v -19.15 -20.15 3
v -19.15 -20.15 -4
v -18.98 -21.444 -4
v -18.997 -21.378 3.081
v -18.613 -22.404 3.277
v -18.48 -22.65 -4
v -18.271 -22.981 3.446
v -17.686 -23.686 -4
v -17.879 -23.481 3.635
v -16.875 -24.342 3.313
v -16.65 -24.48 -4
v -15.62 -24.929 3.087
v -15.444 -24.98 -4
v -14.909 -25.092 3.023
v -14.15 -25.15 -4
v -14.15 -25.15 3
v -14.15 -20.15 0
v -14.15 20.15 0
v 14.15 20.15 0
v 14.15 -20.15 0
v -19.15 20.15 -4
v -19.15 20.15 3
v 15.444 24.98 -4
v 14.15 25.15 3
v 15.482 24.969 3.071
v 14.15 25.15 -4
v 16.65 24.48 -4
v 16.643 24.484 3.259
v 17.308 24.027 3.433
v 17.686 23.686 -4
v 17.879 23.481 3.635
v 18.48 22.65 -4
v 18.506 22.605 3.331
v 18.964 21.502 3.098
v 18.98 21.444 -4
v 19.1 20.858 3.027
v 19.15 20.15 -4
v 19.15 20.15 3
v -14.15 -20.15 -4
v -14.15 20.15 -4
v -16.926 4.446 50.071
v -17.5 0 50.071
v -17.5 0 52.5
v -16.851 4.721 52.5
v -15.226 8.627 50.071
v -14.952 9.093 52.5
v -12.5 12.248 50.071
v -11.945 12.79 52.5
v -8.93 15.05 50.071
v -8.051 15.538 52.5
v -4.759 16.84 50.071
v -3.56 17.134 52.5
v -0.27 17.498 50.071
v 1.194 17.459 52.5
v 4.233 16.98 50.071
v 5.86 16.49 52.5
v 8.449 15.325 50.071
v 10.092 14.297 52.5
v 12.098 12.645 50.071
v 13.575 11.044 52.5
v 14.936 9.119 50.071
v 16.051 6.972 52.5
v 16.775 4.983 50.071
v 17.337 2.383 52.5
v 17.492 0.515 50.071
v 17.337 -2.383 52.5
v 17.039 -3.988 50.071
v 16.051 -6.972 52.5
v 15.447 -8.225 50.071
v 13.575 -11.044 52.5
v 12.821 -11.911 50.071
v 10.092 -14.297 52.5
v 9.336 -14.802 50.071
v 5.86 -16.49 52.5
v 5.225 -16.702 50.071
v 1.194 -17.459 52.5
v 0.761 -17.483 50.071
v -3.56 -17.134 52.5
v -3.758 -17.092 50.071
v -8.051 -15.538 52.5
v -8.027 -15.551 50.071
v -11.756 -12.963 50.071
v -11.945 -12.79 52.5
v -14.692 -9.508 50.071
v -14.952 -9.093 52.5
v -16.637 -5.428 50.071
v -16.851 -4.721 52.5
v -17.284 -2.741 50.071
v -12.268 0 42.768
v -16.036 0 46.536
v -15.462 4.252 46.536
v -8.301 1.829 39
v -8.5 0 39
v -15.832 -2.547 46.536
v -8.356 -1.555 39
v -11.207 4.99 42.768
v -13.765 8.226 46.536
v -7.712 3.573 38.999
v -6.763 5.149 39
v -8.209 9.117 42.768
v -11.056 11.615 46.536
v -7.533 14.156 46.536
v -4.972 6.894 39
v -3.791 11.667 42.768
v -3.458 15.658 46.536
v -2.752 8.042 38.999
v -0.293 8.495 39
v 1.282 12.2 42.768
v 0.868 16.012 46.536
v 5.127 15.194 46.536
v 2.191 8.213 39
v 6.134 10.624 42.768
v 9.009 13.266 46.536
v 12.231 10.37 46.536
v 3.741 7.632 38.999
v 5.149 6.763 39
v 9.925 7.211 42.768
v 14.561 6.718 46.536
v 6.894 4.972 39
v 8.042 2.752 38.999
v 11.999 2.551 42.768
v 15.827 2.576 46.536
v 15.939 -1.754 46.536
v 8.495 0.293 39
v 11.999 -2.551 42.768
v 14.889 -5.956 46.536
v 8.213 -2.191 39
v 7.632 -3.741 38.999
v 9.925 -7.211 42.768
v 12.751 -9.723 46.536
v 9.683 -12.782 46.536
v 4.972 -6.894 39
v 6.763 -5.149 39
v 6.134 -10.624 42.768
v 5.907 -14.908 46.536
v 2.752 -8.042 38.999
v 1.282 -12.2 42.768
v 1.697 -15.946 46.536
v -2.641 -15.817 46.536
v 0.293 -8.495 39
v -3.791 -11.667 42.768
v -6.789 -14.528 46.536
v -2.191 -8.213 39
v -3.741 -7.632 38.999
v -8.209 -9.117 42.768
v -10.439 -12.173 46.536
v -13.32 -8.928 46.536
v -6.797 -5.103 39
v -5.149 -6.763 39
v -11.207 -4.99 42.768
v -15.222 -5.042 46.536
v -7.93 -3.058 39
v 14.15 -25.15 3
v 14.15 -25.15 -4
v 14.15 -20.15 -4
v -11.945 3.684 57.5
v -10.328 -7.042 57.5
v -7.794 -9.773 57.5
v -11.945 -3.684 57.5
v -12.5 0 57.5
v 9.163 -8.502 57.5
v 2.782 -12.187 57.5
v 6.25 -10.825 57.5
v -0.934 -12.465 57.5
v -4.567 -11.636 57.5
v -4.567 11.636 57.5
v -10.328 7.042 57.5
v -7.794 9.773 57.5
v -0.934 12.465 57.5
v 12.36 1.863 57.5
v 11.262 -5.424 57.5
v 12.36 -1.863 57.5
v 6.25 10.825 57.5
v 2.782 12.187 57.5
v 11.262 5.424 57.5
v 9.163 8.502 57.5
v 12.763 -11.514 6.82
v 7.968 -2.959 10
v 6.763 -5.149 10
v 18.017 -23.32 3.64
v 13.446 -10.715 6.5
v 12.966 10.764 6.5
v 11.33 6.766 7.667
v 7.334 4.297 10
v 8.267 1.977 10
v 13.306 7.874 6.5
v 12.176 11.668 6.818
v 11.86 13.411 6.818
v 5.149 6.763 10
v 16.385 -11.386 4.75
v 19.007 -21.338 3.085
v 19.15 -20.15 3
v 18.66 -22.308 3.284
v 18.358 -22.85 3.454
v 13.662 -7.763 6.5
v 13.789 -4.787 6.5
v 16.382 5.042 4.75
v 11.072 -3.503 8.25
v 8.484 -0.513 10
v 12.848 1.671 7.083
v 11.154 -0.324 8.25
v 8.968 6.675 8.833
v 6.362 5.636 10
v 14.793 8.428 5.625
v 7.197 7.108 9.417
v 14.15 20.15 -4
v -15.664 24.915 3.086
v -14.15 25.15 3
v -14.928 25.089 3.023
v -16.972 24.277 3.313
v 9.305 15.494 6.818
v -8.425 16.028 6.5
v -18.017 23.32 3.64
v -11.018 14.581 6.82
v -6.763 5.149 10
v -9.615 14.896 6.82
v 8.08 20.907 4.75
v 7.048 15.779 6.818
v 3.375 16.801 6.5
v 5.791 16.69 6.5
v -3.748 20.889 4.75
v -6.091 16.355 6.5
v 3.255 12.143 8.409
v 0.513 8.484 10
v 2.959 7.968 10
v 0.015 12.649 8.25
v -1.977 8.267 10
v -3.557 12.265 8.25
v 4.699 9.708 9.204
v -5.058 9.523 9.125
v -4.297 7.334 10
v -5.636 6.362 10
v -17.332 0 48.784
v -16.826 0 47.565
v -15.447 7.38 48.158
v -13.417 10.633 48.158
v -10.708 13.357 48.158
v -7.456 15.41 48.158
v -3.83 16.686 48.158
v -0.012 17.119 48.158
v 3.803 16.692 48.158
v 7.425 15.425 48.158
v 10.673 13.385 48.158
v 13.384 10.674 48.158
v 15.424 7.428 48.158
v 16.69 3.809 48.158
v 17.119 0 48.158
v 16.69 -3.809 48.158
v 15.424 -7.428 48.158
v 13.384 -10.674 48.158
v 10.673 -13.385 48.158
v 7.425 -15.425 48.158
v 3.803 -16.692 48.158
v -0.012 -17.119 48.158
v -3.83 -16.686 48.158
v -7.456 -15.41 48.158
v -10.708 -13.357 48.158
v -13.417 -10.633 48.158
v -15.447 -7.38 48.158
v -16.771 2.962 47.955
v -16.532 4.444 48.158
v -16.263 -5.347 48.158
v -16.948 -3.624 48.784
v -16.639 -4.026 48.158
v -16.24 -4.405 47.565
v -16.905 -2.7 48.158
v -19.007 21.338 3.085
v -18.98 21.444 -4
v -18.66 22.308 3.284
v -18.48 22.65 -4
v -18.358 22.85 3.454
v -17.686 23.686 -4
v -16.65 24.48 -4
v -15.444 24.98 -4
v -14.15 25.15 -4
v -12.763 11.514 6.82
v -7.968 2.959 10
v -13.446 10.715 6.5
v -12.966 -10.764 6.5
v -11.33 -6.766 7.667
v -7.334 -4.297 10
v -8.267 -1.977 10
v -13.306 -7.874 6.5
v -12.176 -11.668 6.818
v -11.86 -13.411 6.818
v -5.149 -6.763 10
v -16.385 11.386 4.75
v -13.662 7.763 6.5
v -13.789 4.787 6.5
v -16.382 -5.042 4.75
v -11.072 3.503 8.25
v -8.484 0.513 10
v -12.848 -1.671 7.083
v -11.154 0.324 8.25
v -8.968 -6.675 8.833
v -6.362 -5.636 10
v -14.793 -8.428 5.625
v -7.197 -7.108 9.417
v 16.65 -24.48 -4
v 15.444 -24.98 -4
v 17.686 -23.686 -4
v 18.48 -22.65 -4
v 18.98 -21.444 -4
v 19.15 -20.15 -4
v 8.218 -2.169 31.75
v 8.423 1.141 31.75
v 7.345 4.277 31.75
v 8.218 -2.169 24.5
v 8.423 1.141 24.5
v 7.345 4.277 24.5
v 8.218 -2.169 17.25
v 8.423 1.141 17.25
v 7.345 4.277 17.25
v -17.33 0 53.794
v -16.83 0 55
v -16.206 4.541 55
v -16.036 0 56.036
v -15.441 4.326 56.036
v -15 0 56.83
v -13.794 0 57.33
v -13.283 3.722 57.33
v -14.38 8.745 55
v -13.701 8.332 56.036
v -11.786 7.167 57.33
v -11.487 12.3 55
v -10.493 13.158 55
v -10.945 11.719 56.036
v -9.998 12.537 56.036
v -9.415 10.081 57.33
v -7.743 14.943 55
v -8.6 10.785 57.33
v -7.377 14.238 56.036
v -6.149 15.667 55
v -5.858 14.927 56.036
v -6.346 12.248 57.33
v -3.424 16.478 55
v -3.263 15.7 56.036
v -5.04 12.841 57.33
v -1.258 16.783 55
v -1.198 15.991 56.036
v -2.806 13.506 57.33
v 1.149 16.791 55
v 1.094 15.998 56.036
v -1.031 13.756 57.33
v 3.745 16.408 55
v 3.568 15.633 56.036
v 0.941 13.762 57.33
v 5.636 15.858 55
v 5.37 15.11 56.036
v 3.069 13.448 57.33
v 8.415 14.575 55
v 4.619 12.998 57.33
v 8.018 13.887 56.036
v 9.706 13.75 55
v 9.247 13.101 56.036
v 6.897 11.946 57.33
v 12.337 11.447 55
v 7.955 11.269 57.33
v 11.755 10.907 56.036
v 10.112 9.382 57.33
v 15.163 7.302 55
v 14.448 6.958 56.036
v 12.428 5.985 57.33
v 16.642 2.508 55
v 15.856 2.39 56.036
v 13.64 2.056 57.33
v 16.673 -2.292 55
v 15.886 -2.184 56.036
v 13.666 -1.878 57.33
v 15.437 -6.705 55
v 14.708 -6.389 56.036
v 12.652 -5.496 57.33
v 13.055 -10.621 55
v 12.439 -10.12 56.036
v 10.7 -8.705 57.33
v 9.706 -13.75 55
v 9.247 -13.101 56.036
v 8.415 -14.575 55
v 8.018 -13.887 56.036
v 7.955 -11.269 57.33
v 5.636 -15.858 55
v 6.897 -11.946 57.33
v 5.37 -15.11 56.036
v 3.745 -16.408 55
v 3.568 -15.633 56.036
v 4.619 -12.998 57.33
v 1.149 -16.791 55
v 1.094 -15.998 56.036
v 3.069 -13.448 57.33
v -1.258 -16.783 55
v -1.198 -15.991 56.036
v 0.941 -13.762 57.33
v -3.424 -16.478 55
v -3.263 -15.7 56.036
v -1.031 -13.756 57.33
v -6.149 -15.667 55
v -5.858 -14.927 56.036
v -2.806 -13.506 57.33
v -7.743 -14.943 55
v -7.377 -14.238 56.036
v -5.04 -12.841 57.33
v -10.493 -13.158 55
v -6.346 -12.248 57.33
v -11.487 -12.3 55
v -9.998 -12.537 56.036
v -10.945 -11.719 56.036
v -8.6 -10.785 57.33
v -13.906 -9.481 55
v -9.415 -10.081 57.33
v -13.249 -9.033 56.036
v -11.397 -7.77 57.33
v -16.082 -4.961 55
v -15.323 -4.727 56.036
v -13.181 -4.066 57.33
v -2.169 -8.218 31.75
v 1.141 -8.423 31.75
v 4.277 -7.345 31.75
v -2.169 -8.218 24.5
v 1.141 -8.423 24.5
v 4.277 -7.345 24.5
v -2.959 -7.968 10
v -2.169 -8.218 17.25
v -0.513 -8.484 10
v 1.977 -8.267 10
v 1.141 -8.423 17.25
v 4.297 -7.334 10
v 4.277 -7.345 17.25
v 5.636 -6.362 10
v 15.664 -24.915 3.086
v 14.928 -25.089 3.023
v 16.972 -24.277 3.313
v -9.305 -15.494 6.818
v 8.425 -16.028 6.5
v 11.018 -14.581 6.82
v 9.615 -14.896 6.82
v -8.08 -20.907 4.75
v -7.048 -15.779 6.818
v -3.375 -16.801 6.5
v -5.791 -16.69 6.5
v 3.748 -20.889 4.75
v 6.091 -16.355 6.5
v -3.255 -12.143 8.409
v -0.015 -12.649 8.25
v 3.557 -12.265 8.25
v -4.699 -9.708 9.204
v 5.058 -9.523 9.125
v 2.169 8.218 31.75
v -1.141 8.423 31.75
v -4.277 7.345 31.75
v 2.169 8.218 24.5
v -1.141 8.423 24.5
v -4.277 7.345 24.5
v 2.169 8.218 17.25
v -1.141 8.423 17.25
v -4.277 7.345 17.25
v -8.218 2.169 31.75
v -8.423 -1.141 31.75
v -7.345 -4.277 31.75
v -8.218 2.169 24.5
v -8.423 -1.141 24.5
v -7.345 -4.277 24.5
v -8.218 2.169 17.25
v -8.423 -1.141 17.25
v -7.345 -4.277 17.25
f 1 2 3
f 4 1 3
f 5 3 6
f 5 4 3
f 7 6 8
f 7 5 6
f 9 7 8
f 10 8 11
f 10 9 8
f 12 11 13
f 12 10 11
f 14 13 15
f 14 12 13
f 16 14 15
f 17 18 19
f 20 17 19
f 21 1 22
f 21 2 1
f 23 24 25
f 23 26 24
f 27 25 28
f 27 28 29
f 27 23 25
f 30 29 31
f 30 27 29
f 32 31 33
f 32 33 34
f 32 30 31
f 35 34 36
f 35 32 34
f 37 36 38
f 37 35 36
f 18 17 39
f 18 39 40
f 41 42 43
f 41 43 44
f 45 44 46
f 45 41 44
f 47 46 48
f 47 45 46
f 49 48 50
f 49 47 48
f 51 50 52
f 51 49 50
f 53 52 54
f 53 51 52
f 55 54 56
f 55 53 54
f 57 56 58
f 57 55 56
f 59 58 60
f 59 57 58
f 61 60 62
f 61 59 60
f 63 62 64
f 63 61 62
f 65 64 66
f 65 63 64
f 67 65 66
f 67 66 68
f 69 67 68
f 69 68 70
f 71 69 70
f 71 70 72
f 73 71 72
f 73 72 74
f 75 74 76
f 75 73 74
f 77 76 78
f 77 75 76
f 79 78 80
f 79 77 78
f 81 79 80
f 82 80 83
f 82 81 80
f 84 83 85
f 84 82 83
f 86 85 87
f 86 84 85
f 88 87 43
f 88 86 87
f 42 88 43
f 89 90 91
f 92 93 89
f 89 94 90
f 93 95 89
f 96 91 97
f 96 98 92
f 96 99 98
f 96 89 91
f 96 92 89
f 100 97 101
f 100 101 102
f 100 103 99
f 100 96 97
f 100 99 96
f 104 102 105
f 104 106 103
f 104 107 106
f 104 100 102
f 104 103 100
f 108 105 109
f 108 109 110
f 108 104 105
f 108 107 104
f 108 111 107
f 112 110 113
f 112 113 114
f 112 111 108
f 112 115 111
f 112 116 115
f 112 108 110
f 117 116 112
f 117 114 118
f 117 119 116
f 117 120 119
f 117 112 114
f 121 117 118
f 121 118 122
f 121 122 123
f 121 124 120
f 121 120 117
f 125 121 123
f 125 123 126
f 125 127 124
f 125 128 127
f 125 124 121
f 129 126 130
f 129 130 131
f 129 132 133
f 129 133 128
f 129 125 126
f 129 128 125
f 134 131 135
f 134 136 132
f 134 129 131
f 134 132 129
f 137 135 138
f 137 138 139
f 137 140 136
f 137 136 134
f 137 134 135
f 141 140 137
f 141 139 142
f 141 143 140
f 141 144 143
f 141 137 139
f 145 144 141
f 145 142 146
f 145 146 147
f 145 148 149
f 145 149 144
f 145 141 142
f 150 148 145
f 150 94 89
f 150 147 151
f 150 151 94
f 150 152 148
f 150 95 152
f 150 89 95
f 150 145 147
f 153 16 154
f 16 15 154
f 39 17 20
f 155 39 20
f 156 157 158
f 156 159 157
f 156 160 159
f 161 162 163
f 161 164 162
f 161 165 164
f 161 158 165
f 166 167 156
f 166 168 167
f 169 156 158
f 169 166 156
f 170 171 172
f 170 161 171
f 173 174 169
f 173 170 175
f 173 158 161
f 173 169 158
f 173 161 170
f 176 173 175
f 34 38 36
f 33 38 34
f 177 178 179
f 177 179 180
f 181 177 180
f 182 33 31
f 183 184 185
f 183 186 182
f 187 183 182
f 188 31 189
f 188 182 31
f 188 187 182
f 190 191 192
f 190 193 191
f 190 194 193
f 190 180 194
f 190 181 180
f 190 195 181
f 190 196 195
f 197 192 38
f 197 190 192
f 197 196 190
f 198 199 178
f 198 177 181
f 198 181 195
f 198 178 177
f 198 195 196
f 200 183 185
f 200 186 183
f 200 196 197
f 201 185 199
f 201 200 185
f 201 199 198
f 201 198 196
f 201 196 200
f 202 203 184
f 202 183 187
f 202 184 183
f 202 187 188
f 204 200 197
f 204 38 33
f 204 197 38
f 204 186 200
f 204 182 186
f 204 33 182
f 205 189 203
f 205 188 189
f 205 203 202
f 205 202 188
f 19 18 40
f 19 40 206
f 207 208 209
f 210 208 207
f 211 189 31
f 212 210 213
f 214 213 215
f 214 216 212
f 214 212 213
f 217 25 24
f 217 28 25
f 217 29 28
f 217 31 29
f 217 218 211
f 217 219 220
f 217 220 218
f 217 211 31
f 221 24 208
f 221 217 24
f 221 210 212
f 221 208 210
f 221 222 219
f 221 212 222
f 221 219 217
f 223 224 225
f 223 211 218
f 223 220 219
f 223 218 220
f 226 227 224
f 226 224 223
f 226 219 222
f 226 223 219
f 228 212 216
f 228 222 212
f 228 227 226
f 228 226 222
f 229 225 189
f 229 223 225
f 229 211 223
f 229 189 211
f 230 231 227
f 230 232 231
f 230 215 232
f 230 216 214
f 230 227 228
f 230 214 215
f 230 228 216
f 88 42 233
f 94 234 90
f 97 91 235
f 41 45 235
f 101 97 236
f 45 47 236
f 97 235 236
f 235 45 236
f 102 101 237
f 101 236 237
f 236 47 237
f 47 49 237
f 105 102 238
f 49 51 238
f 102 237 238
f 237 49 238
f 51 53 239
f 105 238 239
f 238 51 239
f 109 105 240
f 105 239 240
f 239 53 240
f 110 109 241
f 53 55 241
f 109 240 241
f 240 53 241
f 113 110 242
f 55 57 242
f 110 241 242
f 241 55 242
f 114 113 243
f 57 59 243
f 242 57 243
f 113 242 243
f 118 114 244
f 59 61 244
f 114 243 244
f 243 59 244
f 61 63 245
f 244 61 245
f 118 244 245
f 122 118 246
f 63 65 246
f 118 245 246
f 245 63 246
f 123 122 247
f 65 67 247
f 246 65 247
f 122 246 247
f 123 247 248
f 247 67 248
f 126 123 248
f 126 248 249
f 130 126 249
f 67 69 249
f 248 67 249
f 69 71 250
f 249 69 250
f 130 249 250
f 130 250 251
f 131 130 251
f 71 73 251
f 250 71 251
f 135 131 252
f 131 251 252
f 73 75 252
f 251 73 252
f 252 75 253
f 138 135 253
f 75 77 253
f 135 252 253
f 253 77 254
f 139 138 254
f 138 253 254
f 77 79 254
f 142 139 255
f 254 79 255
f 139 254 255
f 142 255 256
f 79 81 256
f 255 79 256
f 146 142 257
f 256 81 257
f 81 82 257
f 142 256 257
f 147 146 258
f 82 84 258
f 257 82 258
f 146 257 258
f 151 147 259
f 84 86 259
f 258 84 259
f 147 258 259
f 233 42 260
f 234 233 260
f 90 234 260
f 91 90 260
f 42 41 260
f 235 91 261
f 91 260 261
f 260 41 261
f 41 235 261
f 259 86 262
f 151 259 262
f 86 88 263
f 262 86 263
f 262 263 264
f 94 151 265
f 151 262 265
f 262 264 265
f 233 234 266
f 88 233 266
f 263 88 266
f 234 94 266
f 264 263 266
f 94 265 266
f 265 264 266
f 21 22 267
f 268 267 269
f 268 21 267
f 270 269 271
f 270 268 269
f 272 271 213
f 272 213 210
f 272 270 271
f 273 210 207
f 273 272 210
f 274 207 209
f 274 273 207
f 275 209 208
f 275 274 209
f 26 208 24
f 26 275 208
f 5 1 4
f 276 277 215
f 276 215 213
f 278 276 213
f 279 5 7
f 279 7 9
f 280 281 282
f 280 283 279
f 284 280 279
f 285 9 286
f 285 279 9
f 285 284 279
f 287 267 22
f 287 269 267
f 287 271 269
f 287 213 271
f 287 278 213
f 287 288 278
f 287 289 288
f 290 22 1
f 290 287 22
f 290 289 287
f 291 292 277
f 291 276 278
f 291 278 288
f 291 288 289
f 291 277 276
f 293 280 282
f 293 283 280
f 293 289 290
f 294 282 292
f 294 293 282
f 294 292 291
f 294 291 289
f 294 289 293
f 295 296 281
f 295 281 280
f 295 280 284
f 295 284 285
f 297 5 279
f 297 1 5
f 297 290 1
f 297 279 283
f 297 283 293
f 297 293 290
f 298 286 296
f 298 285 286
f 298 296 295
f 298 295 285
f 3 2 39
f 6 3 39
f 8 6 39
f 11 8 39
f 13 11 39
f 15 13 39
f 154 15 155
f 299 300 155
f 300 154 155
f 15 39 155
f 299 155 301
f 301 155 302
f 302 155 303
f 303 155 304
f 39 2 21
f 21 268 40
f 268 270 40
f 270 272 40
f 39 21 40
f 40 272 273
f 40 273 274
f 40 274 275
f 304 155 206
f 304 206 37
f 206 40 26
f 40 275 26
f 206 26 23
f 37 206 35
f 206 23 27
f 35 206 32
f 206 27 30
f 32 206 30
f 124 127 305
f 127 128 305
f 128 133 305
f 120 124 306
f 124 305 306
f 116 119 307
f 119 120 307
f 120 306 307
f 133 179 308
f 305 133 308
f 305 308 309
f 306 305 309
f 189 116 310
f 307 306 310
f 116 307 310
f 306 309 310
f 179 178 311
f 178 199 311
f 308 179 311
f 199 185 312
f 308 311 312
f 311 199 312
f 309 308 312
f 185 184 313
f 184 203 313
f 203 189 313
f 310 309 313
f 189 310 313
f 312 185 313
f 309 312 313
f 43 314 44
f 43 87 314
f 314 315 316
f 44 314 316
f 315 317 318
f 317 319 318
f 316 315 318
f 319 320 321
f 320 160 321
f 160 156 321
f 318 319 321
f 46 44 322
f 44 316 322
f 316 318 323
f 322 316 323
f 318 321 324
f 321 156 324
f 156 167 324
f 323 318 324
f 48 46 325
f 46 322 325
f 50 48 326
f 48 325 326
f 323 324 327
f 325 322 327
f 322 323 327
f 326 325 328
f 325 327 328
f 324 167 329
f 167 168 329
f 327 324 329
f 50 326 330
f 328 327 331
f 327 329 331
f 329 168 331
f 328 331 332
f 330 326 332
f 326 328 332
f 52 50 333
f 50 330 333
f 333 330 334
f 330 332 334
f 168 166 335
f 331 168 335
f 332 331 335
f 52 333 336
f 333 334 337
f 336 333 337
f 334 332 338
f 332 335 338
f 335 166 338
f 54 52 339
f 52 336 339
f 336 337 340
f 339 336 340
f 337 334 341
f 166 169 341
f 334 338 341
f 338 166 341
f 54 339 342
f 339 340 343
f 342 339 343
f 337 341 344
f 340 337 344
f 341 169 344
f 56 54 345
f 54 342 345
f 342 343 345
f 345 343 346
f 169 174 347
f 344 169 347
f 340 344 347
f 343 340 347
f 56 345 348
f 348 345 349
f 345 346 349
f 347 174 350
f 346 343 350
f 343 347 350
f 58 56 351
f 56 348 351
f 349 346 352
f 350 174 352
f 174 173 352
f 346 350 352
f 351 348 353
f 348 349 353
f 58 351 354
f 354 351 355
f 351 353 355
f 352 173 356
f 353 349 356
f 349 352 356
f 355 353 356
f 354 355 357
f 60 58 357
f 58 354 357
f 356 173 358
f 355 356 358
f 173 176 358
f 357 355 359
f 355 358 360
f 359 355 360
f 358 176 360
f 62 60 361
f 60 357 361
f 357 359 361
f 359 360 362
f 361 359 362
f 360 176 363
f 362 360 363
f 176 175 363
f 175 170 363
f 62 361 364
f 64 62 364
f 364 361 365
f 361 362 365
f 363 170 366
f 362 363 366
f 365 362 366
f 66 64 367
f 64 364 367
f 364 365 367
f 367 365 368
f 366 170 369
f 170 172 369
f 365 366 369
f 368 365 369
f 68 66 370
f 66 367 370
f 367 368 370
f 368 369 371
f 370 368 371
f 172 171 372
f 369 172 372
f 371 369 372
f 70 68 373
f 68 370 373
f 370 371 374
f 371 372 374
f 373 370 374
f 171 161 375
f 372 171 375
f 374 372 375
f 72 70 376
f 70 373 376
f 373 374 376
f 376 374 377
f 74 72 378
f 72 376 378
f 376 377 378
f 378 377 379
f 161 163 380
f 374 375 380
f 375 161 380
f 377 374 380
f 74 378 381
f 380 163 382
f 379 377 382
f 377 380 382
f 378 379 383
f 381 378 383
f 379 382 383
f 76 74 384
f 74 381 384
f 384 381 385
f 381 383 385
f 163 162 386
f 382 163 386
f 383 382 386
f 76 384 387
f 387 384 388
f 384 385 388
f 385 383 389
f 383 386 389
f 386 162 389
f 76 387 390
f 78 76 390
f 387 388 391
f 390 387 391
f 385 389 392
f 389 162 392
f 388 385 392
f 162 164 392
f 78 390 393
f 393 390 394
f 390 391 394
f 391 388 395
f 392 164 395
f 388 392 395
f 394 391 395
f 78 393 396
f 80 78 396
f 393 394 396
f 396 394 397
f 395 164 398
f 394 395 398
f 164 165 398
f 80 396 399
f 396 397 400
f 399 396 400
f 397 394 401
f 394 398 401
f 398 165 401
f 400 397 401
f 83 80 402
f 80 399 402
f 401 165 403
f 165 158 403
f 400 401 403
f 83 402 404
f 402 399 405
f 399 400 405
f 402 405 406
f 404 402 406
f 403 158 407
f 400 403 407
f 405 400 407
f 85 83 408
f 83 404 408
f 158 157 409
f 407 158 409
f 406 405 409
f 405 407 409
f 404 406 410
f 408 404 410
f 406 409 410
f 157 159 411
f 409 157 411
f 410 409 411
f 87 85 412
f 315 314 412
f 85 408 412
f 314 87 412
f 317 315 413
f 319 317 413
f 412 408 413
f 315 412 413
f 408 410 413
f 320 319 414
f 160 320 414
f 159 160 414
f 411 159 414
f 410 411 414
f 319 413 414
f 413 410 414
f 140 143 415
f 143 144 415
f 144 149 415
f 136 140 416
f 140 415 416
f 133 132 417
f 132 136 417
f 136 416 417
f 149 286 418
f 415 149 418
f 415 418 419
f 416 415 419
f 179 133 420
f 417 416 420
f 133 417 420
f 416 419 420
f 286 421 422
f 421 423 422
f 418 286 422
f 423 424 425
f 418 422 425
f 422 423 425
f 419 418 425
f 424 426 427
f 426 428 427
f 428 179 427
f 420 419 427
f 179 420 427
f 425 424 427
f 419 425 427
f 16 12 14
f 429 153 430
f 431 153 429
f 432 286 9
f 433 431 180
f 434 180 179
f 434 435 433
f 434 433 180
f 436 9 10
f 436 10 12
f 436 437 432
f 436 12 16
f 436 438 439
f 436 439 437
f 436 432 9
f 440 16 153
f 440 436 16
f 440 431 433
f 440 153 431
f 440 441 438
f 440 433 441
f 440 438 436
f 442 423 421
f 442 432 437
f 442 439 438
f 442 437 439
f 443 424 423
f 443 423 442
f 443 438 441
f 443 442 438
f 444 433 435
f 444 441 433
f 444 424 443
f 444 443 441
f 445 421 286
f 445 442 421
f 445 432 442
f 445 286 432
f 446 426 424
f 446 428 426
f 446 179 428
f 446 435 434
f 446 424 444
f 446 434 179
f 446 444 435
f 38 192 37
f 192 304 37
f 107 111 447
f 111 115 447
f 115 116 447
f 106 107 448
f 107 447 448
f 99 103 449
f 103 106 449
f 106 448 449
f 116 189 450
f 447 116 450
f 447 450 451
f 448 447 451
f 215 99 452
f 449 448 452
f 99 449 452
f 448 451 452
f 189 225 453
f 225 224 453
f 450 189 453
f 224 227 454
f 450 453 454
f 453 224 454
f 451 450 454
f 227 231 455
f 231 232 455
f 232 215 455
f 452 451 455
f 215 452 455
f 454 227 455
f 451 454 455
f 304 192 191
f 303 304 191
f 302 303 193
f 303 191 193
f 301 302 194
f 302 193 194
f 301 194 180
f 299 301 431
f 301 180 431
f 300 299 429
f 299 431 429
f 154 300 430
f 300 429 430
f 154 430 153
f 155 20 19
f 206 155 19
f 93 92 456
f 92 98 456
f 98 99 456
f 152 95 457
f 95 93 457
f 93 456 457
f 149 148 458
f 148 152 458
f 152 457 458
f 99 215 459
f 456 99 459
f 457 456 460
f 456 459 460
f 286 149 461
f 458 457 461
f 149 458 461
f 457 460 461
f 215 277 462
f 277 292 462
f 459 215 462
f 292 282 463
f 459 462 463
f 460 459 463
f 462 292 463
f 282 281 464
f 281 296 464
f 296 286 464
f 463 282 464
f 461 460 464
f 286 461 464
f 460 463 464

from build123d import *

# Parameters (mm, degrees)
F0_W      = 38.3
F0_H      = 50.3
F0_W_2    = 28.3
F0_H_2    = 40.3
F4_DEPTH  = 4
F5_DEPTH  = 3
F5_FACE_W = 38.3
F5_FACE_H = 50.3
F7_DEPTH  = 35
F9_DEPTH  = 8
F10_R     = 5
F11_R     = 5


# Not quite as in the source:
# - the arcs of a loft's sections are written as splines that run evenly, so that the points pair up as in the source's solid


with BuildPart() as f4:
    # F0 (on Top) → F4 (new body)
    with BuildSketch(Plane.XY):
        Rectangle(F0_W, F0_H)
        Rectangle(F0_W_2, F0_H_2, mode=Mode.SUBTRACT)
    extrude(amount=-F4_DEPTH)

    # F0 (on Top) → F5 (join)
    with BuildSketch(Plane.XY):
        Rectangle(F0_W, F0_H)
        Rectangle(F0_W_2, F0_H_2, mode=Mode.SUBTRACT)
        Rectangle(F0_W_2, F0_H_2)
    extrude(amount=F5_DEPTH)

    # F5_face (on face) → F6 section 0
    with BuildSketch(Plane.XY.offset(3)):
        Rectangle(F5_FACE_W, F5_FACE_H)
    # F2 (on offset) → F6 section 1
    with BuildSketch(Plane.XY.offset(10)):
        with BuildLine():
            add(Edge.make_bspline(
                [(5.1493417049, 6.762712474), (4.2641047121, 7.436759727), (3.2451924408, 7.934526467), (1.09359433, 8.5024723272), (-0.0382449475, 8.5724279849), (-2.2434058754, 8.2737605906), (-3.3158598892, 7.9052550514), (-5.2388678728, 6.785443806), (-6.0886652211, 6.0345786977), (-6.762712474, 5.1493417049)],
                knots=[0, 0, 0, 0, 0.25, 0.25, 0.5, 0.5, 0.75, 0.75, 1, 1, 1, 1], degree=3))
            add(Edge.make_bspline(
                [(-6.762712474, 5.1493417049), (-7.436759727, 4.2641047121), (-7.934526467, 3.2451924408), (-8.5024723272, 1.09359433), (-8.5724279849, -0.0382449475), (-8.2737605906, -2.2434058754), (-7.9052550514, -3.3158598892), (-6.785443806, -5.2388678728), (-6.0345786977, -6.0886652211), (-5.1493417049, -6.762712474)],
                knots=[0, 0, 0, 0, 0.25, 0.25, 0.5, 0.5, 0.75, 0.75, 1, 1, 1, 1], degree=3))
            add(Edge.make_bspline(
                [(-5.1493417049, -6.762712474), (-4.2641047121, -7.436759727), (-3.2451924408, -7.934526467), (-1.09359433, -8.5024723272), (0.0382449475, -8.5724279849), (2.2434058754, -8.2737605906), (3.3158598892, -7.9052550514), (5.2388678728, -6.785443806), (6.0886652211, -6.0345786977), (6.762712474, -5.1493417049)],
                knots=[0, 0, 0, 0, 0.25, 0.25, 0.5, 0.5, 0.75, 0.75, 1, 1, 1, 1], degree=3))
            add(Edge.make_bspline(
                [(6.762712474, -5.1493417049), (7.436759727, -4.2641047121), (7.934526467, -3.2451924408), (8.5024723272, -1.09359433), (8.5724279849, 0.0382449475), (8.2737605906, 2.2434058754), (7.9052550514, 3.3158598892), (6.785443806, 5.2388678728), (6.0345786977, 6.0886652211), (5.1493417049, 6.762712474)],
                knots=[0, 0, 0, 0, 0.25, 0.25, 0.5, 0.5, 0.75, 0.75, 1, 1, 1, 1], degree=3))
        make_face()
    loft(ruled=True)

    # F7 (add): a face of the model
    f7_faces = [f4.faces().sort_by_distance(p)[0] for p in [
        (0, 0, 10),
    ]]
    extrude(f7_faces, amount=F7_DEPTH)

    # F3 (on Front) → F8 (revolve)
    with BuildSketch(Plane.XZ):
        with BuildLine():
            Line((0, 30.5), (0, 65.5))
            ThreePointArc((0, 65.5), (-12.3743686708, 60.3743686708), (-17.5, 48))
            Line((-17.5, 48), (0, 30.5))
        make_face()
        with BuildLine():
            ThreePointArc((-17.5, 48), (-12.3743686708, 60.3743686708), (0, 65.5))
            Line((0, 65.5), (-17.5, 65.5))
            Line((-17.5, 65.5), (-17.5, 48))
        make_face()
    revolve(axis=Axis((0, 0, 48), (0, 0, -1)))

    # F9 (cut): a face of the model
    f9_faces = [f4.faces().sort_by_distance(p)[0] for p in [
        (0, 0, 65.5),
    ]]
    extrude(f9_faces, amount=-F9_DEPTH, mode=Mode.SUBTRACT)

    # F10
    f10_edges = [f4.edges().sort_by_distance(p)[0] for p in [
        (17.5, 0, 57.5),
        (17.5, 0, 48),
    ]]
    fillet(f10_edges, radius=F10_R)

    # F11
    f11_edges = [f4.edges().sort_by_distance(p)[0] for p in [
        (-19.15, -25.15, -0.5),
        (-19.15, 25.15, -0.5),
        (19.15, 25.15, -0.5),
        (19.15, -25.15, -0.5),
    ]]
    fillet(f11_edges, radius=F11_R)


solid = f4.part
